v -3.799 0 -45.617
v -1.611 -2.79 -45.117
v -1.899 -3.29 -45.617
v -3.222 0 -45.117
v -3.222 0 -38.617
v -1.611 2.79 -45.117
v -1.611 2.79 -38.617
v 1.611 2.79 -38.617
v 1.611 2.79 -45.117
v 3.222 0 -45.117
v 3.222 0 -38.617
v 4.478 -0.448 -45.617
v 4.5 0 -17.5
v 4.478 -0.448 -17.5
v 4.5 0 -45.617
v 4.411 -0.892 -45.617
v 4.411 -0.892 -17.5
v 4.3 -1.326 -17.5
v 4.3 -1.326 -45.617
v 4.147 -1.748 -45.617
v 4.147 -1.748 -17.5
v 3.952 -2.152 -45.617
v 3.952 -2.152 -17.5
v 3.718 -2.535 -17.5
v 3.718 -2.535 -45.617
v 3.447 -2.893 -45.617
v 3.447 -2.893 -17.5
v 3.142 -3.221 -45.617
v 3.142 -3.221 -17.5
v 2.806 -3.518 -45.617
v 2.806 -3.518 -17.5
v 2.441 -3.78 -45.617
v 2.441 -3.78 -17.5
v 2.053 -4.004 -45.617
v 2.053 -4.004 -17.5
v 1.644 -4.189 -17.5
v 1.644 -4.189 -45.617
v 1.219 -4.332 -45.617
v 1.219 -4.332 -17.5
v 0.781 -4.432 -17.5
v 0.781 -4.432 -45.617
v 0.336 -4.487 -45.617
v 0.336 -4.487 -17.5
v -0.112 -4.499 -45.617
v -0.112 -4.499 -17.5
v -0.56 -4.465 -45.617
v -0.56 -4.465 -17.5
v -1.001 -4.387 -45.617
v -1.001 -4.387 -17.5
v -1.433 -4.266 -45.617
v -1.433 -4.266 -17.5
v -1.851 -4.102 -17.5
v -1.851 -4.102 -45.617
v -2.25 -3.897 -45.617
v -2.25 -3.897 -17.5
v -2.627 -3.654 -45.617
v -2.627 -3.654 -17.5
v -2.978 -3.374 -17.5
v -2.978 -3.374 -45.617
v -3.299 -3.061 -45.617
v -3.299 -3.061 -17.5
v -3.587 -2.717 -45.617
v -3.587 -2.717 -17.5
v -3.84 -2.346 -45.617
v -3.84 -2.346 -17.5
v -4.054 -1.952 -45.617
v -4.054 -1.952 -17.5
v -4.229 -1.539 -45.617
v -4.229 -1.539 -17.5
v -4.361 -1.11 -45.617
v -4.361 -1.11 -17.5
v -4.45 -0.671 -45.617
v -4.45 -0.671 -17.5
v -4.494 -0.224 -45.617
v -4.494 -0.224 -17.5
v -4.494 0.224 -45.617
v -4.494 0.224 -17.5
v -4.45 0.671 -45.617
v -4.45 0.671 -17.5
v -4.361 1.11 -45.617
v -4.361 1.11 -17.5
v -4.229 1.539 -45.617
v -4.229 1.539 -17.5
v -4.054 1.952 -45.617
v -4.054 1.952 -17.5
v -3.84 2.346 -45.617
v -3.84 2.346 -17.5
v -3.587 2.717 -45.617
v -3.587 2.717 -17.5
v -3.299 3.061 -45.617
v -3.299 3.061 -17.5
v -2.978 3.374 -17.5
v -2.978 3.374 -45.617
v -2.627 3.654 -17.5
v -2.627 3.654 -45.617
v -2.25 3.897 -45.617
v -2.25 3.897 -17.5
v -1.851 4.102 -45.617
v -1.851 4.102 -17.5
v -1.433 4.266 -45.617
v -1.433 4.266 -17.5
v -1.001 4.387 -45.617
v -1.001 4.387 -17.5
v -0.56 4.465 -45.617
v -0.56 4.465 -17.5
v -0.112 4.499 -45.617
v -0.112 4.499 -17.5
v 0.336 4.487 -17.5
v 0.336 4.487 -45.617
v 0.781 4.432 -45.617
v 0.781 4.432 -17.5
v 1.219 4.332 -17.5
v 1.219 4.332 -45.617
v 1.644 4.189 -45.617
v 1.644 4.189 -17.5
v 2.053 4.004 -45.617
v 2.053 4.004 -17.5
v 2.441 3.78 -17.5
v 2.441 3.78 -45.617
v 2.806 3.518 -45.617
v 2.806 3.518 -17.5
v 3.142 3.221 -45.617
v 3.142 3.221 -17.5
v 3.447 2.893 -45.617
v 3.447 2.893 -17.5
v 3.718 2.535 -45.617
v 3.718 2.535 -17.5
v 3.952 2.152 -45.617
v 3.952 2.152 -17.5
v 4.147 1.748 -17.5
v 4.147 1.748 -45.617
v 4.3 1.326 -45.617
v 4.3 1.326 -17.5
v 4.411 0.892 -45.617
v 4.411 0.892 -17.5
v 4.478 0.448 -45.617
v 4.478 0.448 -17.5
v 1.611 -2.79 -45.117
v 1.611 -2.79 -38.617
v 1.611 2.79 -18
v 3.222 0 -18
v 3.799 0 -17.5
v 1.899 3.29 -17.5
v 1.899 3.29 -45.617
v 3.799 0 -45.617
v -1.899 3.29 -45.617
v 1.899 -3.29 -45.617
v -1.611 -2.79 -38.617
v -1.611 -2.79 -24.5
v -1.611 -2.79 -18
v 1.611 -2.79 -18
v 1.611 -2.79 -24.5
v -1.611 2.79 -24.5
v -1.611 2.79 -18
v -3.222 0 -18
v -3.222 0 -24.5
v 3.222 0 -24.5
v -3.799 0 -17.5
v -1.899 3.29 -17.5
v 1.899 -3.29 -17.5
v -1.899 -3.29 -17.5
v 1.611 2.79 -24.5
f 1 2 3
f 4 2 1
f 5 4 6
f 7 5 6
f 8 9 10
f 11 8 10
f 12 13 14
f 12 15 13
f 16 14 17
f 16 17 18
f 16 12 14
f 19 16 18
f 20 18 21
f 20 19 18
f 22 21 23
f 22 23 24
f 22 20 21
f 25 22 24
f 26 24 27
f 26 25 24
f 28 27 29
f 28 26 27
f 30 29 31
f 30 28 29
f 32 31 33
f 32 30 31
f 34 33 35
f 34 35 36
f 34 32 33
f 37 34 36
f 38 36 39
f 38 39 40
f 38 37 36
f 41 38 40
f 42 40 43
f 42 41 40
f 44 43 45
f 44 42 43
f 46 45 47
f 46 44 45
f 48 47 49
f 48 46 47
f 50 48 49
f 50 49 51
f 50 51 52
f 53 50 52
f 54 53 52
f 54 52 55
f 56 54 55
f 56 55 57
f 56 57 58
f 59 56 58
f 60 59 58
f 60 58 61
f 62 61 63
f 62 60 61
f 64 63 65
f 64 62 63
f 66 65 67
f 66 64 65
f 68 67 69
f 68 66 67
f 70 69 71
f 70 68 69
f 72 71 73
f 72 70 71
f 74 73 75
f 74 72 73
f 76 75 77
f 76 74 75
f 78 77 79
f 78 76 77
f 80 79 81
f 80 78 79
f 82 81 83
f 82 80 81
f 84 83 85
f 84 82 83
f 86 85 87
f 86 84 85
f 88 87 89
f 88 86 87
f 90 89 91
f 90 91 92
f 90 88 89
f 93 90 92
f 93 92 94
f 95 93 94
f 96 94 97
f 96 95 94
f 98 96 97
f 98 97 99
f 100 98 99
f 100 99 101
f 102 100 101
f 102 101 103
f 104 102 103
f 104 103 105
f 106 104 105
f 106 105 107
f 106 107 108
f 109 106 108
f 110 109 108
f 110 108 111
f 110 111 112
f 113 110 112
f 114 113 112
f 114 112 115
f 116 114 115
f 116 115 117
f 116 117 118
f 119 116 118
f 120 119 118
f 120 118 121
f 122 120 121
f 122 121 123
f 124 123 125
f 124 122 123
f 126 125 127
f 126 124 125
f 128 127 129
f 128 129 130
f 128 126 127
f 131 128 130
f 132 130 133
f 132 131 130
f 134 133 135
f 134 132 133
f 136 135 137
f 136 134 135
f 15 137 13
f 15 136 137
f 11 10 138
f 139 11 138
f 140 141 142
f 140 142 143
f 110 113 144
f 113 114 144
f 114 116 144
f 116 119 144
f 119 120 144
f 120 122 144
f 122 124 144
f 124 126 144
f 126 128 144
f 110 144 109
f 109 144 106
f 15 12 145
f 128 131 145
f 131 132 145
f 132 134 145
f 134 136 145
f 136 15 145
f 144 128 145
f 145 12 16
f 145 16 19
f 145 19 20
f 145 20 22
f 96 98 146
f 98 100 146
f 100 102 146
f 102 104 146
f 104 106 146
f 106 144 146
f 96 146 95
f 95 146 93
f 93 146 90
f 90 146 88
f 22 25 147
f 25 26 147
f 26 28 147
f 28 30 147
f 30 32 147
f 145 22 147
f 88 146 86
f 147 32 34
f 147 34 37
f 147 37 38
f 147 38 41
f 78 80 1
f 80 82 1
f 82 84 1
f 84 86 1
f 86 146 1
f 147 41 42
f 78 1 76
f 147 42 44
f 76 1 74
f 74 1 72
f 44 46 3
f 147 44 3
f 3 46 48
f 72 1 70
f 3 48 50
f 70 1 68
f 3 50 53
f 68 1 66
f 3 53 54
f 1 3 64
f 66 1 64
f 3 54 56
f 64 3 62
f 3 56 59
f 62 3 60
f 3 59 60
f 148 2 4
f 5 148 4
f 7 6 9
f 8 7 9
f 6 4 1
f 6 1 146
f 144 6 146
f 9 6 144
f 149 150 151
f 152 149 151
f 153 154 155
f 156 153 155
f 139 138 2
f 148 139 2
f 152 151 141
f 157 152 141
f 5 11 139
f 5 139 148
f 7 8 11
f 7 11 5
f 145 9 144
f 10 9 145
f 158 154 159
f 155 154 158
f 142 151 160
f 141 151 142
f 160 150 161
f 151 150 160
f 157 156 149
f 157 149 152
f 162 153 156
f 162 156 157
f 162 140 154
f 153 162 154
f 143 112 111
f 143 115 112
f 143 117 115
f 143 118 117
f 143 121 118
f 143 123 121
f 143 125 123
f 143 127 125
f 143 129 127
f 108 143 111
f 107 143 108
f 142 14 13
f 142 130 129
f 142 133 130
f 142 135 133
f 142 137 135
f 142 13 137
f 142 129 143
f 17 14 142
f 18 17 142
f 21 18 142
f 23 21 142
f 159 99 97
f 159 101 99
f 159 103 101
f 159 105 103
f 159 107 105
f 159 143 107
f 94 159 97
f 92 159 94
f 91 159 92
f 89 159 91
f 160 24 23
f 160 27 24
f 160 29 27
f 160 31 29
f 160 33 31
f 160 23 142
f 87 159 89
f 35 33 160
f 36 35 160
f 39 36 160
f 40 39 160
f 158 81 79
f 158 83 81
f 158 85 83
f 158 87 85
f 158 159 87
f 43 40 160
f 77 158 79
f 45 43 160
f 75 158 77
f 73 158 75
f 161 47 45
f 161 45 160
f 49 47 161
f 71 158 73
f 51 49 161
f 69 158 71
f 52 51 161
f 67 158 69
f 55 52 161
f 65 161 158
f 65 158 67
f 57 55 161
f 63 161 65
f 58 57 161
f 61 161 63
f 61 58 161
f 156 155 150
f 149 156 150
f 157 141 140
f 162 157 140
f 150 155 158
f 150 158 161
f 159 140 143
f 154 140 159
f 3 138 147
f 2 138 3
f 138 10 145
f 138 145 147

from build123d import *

# Parameters (mm, degrees)
SKETCH1_W          = 4.5
SKETCH1_H          = 28.11709914
CUT_EXTRUDE1_DEPTH = 7
CUT_EXTRUDE2_DEPTH = 7
CHAMFER1_SIZE      = 0.5


with BuildPart() as part:
    # Sketch1 → Revolve-Thin1 (revolve)
    with BuildSketch(Plane(origin=(0, 0, 0), x_dir=(1, 0, 0), z_dir=(0, 1, 0))):
        with Locations((2.25, 31.55854957)):
            Rectangle(SKETCH1_W, SKETCH1_H)
    revolve(axis=Axis((0, 0, 0), (0, 0, -1)))

    # Sketch2 → Cut-Extrude1 (cut)
    with BuildSketch(Plane.XY.offset(-17.5)):
        Polygon((1.610807251, 2.79), (-1.610807251, 2.79), (-3.221614502, 0), (-1.610807251, -2.79), (1.610807251, -2.79), (3.221614502, 0), align=None)
    extrude(amount=-CUT_EXTRUDE1_DEPTH, mode=Mode.SUBTRACT)

    # Sketch3 → Cut-Extrude2 (cut)
    with BuildSketch(Plane(origin=(0, 0, -45.61709914), x_dir=(-1, 0, 0), z_dir=(0, 0, -1))):
        Polygon((1.610807251, 2.79), (-1.610807251, 2.79), (-3.221614502, 0), (-1.610807251, -2.79), (1.610807251, -2.79), (3.221614502, 0), align=None)
    extrude(amount=-CUT_EXTRUDE2_DEPTH, mode=Mode.SUBTRACT)

    # Chamfer1
    chamfer1_edges = [part.edges().sort_by_distance(p)[0] for p in [
        (2.416210877, 1.395, -17.5),
        (0, 2.79, -17.5),
        (-2.416210877, 1.395, -17.5),
        (-2.416210877, -1.395, -17.5),
        (0, -2.79, -17.5),
        (2.416210877, -1.395, -17.5),
        (-2.416210877, 1.395, -45.61709914),
        (0, 2.79, -45.61709914),
        (2.416210877, 1.395, -45.61709914),
        (2.416210877, -1.395, -45.61709914),
        (0, -2.79, -45.61709914),
        (-2.416210877, -1.395, -45.61709914),
    ]]
    chamfer(chamfer1_edges, length=CHAMFER1_SIZE)


solid = part.part
